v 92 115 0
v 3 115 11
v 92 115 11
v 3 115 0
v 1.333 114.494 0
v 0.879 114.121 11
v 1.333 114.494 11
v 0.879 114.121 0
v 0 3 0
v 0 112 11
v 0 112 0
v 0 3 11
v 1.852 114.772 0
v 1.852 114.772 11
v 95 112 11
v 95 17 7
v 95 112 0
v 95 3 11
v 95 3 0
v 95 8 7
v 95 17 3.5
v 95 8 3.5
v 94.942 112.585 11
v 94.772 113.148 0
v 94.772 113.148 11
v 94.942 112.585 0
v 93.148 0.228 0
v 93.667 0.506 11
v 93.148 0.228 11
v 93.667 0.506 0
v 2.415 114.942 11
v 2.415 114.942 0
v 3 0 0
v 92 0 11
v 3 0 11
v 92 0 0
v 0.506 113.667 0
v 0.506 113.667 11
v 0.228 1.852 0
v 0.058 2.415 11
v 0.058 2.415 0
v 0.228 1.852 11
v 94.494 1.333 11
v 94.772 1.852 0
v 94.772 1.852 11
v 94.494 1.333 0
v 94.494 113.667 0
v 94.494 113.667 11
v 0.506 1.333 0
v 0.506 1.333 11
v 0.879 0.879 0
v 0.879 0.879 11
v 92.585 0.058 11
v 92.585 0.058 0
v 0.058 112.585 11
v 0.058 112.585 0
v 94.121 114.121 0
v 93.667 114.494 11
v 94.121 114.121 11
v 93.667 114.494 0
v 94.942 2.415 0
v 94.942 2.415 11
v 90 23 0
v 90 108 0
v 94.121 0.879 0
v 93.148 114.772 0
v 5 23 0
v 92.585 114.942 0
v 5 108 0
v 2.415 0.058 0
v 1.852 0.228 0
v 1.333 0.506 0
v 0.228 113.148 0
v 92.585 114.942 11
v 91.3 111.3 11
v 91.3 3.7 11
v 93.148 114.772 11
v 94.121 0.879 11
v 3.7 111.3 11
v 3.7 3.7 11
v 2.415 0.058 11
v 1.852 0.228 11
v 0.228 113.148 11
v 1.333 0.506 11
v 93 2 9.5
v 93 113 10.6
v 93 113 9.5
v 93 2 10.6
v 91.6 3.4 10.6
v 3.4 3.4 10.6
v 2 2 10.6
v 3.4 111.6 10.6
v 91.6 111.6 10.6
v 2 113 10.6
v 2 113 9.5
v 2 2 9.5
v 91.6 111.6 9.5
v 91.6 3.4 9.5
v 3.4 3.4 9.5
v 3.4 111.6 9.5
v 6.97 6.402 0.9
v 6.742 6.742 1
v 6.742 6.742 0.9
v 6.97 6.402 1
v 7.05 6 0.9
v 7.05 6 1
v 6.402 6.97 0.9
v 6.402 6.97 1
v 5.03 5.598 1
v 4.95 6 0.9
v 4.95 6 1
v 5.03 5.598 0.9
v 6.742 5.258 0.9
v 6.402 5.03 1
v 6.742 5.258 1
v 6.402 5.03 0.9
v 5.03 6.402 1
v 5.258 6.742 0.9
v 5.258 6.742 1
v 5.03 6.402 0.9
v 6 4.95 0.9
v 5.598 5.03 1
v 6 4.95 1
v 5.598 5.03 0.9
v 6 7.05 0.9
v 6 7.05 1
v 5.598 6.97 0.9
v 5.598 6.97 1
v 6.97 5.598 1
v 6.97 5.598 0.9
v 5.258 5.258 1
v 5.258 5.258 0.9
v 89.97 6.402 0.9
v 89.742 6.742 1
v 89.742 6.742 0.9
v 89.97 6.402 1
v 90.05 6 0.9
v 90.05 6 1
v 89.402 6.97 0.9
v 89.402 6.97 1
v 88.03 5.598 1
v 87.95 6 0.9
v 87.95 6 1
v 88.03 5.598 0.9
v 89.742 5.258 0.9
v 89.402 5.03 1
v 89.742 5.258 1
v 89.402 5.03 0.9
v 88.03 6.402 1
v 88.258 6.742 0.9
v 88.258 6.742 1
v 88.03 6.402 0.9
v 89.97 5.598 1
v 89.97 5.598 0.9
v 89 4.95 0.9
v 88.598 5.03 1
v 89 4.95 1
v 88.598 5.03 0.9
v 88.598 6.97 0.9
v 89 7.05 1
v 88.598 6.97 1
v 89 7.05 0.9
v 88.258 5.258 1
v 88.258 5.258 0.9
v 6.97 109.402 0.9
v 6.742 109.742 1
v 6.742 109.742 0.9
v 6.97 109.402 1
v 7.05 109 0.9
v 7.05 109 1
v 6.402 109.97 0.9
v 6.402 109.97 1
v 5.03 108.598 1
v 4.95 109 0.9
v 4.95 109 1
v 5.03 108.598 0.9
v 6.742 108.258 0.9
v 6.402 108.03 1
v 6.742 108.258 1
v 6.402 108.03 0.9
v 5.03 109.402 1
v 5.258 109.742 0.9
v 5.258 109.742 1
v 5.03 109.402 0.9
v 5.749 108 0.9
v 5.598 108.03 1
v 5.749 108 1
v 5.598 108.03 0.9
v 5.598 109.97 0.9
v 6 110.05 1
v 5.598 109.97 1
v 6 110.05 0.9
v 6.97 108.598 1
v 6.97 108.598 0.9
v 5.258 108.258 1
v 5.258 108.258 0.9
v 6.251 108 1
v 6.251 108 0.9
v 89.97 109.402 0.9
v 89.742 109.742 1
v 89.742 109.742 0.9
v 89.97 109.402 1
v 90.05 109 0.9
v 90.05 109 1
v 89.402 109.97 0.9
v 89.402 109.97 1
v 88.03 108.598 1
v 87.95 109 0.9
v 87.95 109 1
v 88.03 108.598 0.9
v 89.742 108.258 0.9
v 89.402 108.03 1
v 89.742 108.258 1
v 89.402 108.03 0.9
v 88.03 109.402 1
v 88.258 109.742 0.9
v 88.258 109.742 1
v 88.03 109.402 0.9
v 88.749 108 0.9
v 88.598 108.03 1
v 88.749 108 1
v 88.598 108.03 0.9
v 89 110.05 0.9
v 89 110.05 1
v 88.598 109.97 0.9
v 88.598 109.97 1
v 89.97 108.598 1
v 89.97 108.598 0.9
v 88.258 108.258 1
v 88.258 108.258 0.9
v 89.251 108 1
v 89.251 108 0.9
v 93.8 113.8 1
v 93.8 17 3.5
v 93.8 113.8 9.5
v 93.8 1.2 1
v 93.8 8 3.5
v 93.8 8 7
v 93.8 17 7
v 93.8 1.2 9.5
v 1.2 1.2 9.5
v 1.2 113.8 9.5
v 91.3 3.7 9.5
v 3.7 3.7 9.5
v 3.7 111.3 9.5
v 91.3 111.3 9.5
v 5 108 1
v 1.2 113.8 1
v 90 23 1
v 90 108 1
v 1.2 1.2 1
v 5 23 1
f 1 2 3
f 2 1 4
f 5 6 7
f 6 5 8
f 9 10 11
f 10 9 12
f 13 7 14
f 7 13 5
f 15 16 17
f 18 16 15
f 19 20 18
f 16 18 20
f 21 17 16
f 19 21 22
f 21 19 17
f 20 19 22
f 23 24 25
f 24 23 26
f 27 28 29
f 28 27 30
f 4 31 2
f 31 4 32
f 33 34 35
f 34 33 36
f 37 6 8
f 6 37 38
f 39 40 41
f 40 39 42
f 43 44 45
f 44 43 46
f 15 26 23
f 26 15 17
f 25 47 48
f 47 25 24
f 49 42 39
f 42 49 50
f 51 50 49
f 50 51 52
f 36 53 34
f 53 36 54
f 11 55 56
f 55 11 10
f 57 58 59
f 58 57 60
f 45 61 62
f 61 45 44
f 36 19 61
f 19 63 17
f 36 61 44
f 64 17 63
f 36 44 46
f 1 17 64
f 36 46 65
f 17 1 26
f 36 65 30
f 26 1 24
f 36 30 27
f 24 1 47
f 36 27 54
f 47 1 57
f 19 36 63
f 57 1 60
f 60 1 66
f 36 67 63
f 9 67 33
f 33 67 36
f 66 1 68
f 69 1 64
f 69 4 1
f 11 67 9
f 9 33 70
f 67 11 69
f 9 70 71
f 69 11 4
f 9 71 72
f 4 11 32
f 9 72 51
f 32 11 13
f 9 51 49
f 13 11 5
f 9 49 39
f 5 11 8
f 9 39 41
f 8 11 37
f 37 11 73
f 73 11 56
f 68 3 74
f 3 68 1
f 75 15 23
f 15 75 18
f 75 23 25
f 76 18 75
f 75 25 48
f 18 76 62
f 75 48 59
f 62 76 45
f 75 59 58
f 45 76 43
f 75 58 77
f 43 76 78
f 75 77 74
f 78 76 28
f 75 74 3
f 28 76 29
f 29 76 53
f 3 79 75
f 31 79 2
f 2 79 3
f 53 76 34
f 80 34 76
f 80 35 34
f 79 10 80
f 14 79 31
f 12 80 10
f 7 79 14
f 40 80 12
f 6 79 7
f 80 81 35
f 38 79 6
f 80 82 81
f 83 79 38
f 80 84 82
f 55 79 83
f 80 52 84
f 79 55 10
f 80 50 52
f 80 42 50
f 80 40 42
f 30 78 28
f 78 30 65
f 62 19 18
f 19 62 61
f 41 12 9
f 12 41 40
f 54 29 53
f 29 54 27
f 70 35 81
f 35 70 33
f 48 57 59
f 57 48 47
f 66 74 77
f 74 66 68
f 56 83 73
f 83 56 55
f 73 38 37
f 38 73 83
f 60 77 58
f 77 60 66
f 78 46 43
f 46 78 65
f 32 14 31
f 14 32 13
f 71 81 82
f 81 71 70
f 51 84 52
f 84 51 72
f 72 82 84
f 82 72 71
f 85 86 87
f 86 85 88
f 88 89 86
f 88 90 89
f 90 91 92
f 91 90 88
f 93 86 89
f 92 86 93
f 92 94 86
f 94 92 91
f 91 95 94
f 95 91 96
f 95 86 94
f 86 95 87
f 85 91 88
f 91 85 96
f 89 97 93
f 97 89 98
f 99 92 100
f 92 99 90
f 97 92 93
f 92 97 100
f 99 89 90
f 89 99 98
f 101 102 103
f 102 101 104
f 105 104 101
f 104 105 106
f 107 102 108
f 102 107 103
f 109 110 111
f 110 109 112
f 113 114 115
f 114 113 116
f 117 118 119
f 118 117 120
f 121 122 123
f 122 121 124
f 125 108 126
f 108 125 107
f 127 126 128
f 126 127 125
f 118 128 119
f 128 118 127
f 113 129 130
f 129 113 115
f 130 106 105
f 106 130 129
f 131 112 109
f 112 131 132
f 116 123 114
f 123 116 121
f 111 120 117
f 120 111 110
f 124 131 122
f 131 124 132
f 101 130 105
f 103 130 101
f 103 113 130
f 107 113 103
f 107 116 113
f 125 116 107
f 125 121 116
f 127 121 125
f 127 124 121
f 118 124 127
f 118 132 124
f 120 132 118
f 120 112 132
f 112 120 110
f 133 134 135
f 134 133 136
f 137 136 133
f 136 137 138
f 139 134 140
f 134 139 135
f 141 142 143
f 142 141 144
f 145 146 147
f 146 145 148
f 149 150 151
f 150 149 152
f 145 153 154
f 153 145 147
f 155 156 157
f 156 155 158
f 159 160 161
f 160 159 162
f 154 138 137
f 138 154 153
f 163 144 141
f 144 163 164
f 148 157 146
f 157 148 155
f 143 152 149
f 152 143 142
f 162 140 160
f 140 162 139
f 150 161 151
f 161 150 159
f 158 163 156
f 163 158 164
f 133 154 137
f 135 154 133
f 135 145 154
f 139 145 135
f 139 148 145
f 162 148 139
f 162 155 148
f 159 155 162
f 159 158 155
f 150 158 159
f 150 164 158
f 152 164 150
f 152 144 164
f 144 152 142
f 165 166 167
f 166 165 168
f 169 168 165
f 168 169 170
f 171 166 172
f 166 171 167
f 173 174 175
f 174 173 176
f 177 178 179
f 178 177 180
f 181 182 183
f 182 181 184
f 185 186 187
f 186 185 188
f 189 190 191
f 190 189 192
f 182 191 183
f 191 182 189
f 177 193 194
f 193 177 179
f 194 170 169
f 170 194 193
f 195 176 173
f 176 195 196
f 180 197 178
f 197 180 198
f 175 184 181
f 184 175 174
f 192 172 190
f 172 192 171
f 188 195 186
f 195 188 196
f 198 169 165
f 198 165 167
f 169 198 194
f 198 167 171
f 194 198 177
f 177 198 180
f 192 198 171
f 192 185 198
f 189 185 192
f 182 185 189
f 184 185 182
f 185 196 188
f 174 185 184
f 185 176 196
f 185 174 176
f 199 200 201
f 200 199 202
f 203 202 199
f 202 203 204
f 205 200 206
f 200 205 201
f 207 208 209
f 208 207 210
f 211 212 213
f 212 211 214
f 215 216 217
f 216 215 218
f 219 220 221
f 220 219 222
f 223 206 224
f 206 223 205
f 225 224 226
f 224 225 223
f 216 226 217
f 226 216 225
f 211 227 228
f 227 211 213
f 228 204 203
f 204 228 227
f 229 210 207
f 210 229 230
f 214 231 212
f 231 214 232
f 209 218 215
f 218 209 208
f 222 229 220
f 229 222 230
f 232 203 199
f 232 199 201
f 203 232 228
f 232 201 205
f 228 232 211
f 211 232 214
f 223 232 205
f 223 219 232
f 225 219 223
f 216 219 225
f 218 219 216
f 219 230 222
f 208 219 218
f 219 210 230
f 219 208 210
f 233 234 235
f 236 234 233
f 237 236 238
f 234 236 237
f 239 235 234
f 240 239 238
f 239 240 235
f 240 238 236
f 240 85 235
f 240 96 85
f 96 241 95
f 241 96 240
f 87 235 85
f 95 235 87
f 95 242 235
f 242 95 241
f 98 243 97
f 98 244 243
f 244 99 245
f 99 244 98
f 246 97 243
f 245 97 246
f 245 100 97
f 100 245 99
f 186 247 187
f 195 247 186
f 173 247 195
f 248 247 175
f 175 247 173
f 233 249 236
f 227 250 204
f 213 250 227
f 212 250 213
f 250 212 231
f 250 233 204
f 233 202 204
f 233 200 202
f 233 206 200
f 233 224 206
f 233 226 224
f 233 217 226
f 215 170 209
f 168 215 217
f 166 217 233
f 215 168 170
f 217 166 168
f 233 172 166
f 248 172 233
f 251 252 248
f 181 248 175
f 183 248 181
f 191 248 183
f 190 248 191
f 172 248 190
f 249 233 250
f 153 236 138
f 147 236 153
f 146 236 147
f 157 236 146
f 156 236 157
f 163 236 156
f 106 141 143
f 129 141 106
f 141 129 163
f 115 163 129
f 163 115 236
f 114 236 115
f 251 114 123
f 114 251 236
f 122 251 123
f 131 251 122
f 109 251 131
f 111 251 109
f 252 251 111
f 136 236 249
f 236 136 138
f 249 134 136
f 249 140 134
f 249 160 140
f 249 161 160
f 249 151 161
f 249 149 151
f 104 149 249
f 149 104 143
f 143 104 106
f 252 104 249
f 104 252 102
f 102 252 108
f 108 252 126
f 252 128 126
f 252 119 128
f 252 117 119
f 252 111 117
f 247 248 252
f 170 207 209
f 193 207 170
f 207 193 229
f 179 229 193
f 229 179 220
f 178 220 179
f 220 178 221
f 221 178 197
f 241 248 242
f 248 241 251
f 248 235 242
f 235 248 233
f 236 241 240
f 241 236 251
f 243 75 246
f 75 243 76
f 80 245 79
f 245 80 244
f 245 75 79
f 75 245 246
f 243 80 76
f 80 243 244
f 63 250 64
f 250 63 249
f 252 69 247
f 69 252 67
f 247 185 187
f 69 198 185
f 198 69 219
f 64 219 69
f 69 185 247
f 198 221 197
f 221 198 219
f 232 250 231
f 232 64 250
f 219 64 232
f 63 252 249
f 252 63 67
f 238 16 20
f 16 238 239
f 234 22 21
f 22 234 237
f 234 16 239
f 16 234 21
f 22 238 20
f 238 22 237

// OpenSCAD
// ============================================================
// MEMRY Shell v4 — DEFINITIVE TWO-PIECE
// All geometry verified. Print-ready.
// ============================================================
//
// FRONT BODY  → front face DOWN, no supports
// BACK PANEL  → outside face DOWN, no supports
// Both: white PLA, 0.15mm layers, 3 perimeters, 20% infill
// Print 4× of each for 4 units.
//
// HARDWARE PER UNIT:
//   4× M2×6mm self-tapping screws
//   4× N52 neodymium 20mm×3mm disc magnets
//   2-part epoxy (for magnets)
//   Clear silicone sealant (for gasket groove + display edge)
//   PCB conformal coating spray (for XIAO + wiring)
//
// MAGNET POCKET (key design):
//   Magnet = 20mm dia × 3mm thick
//   Back panel has 20mm through-hole (1.5mm deep)
//   Front body rim face has 20mm blind recess (2.0mm deep)
//   Combined = 3.5mm pocket → magnet sits in, 0.5mm PLA floor
//   Epoxy from outside seals and locks magnet permanently
//   Ghost ring (raised 0.4mm) marks hole, adds grip on fridge
//
// ASSEMBLY:
//   1. Conformal coat XIAO, cure 24h
//   2. Seat display, route FPC ribbon
//   3. Seat XIAO + LiPo, wire up
//   4. Silicone bead around display window edge (inside)
//   5. Fill gasket groove with silicone sealant
//   6. Drop back panel into rim — self-locating
//   7. Drive 4× M2×6mm screws
//   8. From outside: drop magnets into ghost-ring holes
//   9. Fill with 2-part epoxy, cure 30min
// ============================================================

// ── PARAMETERS ─────────────────────────────────────────────

W  = 95;    H  = 115;   D  = 11;    // outer dims
FW = 1.0;   SW = 1.2;               // front wall, side wall

// Display window
WIN_W=85; WIN_H=85; WIN_GAP=7;

// Display bay
DBW=86; DBH=86; DBD=3.0;

// Component bay (XIAO + LiPo)
CBW=60; CBH=26; CBD=6.0;

// FPC channel
FPC_W=10; FPC_H=3;

// USB-C notch (right side)
UW=9; UH=3.5; UFB=8;

// Corner radius
CR=3.0;

// Rim ledge (front body back opening)
RIM_W=2.5;   // ledge width
RIM_H=1.5;   // ledge height = back panel thickness

// Gasket groove (on rim face)
GW=1.4; GD=1.0; GO=0.8;  // width, depth, offset from inner rim edge

// M2 screw bosses
BOD=6.5;  // boss outer dia
BID=2.1;  // screw hole dia (M2 self-tap)
BOH=7.5;  // boss height (FW to rim face = D-FW-RIM_H = 8.5mm, boss = 7.5mm)
BIN=6.0;  // boss centre inset from outer edge

// Countersink on back panel
CS_D=4.2; CS_DEP=1.2;

// Magnets: 20mm dia × 3mm thick
MAG_D  = 20;
MAG_T  = 3.0;
MAG_FL = 0.5;              // floor thickness
MAG_IN = 16.0;             // magnet centre inset from outer edge
BODY_REC = MAG_T - RIM_H + MAG_FL;  // = 2.0mm recess in front body rim face

// Ghost ring
GHR_OD = MAG_D + 3;  // 23mm outer dia
GHR_RW = 1.2;         // ring wall width
GHR_T  = 0.4;         // raised height

// Panel fit clearance
CLR = 0.15;

// ── DERIVED POSITIONS ──────────────────────────────────────

// Boss centres (global coords — same for both pieces)
BX = [BIN,    W-BIN,  BIN,    W-BIN  ];
BY = [BIN,    BIN,    H-BIN,  H-BIN  ];

// Magnet centres (global coords — same for both pieces)
MX = [MAG_IN,    W-MAG_IN,  MAG_IN,    W-MAG_IN  ];
MY = [MAG_IN,    MAG_IN,    H-MAG_IN,  H-MAG_IN  ];

// Panel bounds
PX = SW + RIM_W + CLR;
PY = SW + RIM_W + CLR;
PW = W - 2*PX;
PH = H - 2*PY;
PZ = D - RIM_H;   // panel inner face Z

// ── UTILITIES ──────────────────────────────────────────────

module rbox(w, h, d, r=CR) {
    hull()
        for (x=[r,w-r]) for (y=[r,h-r])
            translate([x,y,0]) cylinder(r=r, h=d, $fn=32);
}

// ============================================================
// PIECE 1 — FRONT BODY
// ============================================================

module front_body() {
    difference() {
        union() {
            rbox(W, H, D);
            // Screw bosses rise from above front wall to just below rim face
            for (i=[0:3])
                translate([BX[i], BY[i], FW])
                    cylinder(d=BOD, h=BOH, $fn=24);
        }

        // Hollow interior (front wall to rim face)
        translate([SW, SW, FW])
            cube([W-2*SW, H-2*SW, D-FW-RIM_H]);

        // Remove centre of back face leaving only rim band
        translate([SW+RIM_W, SW+RIM_W, D-RIM_H-0.1])
            cube([W-2*(SW+RIM_W), H-2*(SW+RIM_W), RIM_H+0.2]);

        // Display window
        translate([(W-WIN_W)/2, H-WIN_GAP-WIN_H, -0.1])
            cube([WIN_W, WIN_H, FW+0.2]);

        // Display bay
        translate([(W-DBW)/2, H-WIN_GAP-DBH, FW])
            cube([DBW, DBH, DBD]);

        // Component bay
        translate([W-SW-CBW, SW+6, FW])
            cube([CBW, CBH, CBD]);

        // FPC channel
        translate([W-SW-CBW-3, SW+6+CBH, FW])
            cube([FPC_W, 14, FPC_H]);

        // USB-C notch
        translate([W-SW-0.1, UFB, FW+(D-FW-RIM_H)/2-UH/2])
            cube([SW+0.2, UW, UH]);

        // Gasket groove on rim face
        gx = SW + GO;  gy = SW + GO;
        translate([gx, gy, D-RIM_H-0.1])
            difference() {
                cube([W-2*gx, H-2*gy, GD+0.2]);
                translate([GW, GW, -0.1])
                    cube([W-2*gx-2*GW, H-2*gy-2*GW, GD+0.4]);
            }

        // Magnet recesses in rim face (blind pocket floors)
        // 2.0mm deep from rim face into body
        for (i=[0:3])
            translate([MX[i], MY[i], D-RIM_H-BODY_REC])
                cylinder(d=MAG_D, h=BODY_REC+0.1, $fn=48);

        // Boss screw holes
        for (i=[0:3])
            translate([BX[i], BY[i], FW-0.1])
                cylinder(d=BID, h=BOH+0.2, $fn=16);
    }
}

// ============================================================
// PIECE 2 — BACK PANEL
// ============================================================

module back_panel() {
    difference() {
        union() {
            // Panel body — sits inside rim ledge
            translate([PX, PY, PZ])
                cube([PW, PH, RIM_H]);

            // Ghost rings — built on top of panel, connected to it
            // They sit directly over the magnet through-holes
            for (i=[0:3])
                translate([MX[i], MY[i], D])
                    difference() {
                        cylinder(d=GHR_OD, h=GHR_T, $fn=48);
                        // Hollow ring (the through-hole centre stays open)
                        cylinder(d=GHR_OD-2*GHR_RW, h=GHR_T+0.1, $fn=48);
                    }
        }

        // Magnet through-holes (full panel thickness)
        // Aligned to body recesses — together form complete pocket
        for (i=[0:3])
            translate([MX[i], MY[i], PZ-0.1])
                cylinder(d=MAG_D, h=RIM_H+0.2, $fn=48);

        // M2 countersinks on outside face
        for (i=[0:3]) {
            translate([BX[i], BY[i], D-CS_DEP])
                cylinder(d=CS_D, h=CS_DEP+0.1, $fn=24);
            // Screw shaft through-hole
            translate([BX[i], BY[i], PZ-0.1])
                cylinder(d=BID, h=RIM_H+0.2, $fn=16);
        }
    }
}

// ============================================================
// EXPORT
// ============================================================
// FRONT BODY STL: keep only front_body() uncommented
// BACK PANEL STL: comment front_body(), uncomment back_panel()

front_body();
// back_panel();

// Preview side by side:
// front_body();
// translate([W+15, 0, 0]) back_panel();
